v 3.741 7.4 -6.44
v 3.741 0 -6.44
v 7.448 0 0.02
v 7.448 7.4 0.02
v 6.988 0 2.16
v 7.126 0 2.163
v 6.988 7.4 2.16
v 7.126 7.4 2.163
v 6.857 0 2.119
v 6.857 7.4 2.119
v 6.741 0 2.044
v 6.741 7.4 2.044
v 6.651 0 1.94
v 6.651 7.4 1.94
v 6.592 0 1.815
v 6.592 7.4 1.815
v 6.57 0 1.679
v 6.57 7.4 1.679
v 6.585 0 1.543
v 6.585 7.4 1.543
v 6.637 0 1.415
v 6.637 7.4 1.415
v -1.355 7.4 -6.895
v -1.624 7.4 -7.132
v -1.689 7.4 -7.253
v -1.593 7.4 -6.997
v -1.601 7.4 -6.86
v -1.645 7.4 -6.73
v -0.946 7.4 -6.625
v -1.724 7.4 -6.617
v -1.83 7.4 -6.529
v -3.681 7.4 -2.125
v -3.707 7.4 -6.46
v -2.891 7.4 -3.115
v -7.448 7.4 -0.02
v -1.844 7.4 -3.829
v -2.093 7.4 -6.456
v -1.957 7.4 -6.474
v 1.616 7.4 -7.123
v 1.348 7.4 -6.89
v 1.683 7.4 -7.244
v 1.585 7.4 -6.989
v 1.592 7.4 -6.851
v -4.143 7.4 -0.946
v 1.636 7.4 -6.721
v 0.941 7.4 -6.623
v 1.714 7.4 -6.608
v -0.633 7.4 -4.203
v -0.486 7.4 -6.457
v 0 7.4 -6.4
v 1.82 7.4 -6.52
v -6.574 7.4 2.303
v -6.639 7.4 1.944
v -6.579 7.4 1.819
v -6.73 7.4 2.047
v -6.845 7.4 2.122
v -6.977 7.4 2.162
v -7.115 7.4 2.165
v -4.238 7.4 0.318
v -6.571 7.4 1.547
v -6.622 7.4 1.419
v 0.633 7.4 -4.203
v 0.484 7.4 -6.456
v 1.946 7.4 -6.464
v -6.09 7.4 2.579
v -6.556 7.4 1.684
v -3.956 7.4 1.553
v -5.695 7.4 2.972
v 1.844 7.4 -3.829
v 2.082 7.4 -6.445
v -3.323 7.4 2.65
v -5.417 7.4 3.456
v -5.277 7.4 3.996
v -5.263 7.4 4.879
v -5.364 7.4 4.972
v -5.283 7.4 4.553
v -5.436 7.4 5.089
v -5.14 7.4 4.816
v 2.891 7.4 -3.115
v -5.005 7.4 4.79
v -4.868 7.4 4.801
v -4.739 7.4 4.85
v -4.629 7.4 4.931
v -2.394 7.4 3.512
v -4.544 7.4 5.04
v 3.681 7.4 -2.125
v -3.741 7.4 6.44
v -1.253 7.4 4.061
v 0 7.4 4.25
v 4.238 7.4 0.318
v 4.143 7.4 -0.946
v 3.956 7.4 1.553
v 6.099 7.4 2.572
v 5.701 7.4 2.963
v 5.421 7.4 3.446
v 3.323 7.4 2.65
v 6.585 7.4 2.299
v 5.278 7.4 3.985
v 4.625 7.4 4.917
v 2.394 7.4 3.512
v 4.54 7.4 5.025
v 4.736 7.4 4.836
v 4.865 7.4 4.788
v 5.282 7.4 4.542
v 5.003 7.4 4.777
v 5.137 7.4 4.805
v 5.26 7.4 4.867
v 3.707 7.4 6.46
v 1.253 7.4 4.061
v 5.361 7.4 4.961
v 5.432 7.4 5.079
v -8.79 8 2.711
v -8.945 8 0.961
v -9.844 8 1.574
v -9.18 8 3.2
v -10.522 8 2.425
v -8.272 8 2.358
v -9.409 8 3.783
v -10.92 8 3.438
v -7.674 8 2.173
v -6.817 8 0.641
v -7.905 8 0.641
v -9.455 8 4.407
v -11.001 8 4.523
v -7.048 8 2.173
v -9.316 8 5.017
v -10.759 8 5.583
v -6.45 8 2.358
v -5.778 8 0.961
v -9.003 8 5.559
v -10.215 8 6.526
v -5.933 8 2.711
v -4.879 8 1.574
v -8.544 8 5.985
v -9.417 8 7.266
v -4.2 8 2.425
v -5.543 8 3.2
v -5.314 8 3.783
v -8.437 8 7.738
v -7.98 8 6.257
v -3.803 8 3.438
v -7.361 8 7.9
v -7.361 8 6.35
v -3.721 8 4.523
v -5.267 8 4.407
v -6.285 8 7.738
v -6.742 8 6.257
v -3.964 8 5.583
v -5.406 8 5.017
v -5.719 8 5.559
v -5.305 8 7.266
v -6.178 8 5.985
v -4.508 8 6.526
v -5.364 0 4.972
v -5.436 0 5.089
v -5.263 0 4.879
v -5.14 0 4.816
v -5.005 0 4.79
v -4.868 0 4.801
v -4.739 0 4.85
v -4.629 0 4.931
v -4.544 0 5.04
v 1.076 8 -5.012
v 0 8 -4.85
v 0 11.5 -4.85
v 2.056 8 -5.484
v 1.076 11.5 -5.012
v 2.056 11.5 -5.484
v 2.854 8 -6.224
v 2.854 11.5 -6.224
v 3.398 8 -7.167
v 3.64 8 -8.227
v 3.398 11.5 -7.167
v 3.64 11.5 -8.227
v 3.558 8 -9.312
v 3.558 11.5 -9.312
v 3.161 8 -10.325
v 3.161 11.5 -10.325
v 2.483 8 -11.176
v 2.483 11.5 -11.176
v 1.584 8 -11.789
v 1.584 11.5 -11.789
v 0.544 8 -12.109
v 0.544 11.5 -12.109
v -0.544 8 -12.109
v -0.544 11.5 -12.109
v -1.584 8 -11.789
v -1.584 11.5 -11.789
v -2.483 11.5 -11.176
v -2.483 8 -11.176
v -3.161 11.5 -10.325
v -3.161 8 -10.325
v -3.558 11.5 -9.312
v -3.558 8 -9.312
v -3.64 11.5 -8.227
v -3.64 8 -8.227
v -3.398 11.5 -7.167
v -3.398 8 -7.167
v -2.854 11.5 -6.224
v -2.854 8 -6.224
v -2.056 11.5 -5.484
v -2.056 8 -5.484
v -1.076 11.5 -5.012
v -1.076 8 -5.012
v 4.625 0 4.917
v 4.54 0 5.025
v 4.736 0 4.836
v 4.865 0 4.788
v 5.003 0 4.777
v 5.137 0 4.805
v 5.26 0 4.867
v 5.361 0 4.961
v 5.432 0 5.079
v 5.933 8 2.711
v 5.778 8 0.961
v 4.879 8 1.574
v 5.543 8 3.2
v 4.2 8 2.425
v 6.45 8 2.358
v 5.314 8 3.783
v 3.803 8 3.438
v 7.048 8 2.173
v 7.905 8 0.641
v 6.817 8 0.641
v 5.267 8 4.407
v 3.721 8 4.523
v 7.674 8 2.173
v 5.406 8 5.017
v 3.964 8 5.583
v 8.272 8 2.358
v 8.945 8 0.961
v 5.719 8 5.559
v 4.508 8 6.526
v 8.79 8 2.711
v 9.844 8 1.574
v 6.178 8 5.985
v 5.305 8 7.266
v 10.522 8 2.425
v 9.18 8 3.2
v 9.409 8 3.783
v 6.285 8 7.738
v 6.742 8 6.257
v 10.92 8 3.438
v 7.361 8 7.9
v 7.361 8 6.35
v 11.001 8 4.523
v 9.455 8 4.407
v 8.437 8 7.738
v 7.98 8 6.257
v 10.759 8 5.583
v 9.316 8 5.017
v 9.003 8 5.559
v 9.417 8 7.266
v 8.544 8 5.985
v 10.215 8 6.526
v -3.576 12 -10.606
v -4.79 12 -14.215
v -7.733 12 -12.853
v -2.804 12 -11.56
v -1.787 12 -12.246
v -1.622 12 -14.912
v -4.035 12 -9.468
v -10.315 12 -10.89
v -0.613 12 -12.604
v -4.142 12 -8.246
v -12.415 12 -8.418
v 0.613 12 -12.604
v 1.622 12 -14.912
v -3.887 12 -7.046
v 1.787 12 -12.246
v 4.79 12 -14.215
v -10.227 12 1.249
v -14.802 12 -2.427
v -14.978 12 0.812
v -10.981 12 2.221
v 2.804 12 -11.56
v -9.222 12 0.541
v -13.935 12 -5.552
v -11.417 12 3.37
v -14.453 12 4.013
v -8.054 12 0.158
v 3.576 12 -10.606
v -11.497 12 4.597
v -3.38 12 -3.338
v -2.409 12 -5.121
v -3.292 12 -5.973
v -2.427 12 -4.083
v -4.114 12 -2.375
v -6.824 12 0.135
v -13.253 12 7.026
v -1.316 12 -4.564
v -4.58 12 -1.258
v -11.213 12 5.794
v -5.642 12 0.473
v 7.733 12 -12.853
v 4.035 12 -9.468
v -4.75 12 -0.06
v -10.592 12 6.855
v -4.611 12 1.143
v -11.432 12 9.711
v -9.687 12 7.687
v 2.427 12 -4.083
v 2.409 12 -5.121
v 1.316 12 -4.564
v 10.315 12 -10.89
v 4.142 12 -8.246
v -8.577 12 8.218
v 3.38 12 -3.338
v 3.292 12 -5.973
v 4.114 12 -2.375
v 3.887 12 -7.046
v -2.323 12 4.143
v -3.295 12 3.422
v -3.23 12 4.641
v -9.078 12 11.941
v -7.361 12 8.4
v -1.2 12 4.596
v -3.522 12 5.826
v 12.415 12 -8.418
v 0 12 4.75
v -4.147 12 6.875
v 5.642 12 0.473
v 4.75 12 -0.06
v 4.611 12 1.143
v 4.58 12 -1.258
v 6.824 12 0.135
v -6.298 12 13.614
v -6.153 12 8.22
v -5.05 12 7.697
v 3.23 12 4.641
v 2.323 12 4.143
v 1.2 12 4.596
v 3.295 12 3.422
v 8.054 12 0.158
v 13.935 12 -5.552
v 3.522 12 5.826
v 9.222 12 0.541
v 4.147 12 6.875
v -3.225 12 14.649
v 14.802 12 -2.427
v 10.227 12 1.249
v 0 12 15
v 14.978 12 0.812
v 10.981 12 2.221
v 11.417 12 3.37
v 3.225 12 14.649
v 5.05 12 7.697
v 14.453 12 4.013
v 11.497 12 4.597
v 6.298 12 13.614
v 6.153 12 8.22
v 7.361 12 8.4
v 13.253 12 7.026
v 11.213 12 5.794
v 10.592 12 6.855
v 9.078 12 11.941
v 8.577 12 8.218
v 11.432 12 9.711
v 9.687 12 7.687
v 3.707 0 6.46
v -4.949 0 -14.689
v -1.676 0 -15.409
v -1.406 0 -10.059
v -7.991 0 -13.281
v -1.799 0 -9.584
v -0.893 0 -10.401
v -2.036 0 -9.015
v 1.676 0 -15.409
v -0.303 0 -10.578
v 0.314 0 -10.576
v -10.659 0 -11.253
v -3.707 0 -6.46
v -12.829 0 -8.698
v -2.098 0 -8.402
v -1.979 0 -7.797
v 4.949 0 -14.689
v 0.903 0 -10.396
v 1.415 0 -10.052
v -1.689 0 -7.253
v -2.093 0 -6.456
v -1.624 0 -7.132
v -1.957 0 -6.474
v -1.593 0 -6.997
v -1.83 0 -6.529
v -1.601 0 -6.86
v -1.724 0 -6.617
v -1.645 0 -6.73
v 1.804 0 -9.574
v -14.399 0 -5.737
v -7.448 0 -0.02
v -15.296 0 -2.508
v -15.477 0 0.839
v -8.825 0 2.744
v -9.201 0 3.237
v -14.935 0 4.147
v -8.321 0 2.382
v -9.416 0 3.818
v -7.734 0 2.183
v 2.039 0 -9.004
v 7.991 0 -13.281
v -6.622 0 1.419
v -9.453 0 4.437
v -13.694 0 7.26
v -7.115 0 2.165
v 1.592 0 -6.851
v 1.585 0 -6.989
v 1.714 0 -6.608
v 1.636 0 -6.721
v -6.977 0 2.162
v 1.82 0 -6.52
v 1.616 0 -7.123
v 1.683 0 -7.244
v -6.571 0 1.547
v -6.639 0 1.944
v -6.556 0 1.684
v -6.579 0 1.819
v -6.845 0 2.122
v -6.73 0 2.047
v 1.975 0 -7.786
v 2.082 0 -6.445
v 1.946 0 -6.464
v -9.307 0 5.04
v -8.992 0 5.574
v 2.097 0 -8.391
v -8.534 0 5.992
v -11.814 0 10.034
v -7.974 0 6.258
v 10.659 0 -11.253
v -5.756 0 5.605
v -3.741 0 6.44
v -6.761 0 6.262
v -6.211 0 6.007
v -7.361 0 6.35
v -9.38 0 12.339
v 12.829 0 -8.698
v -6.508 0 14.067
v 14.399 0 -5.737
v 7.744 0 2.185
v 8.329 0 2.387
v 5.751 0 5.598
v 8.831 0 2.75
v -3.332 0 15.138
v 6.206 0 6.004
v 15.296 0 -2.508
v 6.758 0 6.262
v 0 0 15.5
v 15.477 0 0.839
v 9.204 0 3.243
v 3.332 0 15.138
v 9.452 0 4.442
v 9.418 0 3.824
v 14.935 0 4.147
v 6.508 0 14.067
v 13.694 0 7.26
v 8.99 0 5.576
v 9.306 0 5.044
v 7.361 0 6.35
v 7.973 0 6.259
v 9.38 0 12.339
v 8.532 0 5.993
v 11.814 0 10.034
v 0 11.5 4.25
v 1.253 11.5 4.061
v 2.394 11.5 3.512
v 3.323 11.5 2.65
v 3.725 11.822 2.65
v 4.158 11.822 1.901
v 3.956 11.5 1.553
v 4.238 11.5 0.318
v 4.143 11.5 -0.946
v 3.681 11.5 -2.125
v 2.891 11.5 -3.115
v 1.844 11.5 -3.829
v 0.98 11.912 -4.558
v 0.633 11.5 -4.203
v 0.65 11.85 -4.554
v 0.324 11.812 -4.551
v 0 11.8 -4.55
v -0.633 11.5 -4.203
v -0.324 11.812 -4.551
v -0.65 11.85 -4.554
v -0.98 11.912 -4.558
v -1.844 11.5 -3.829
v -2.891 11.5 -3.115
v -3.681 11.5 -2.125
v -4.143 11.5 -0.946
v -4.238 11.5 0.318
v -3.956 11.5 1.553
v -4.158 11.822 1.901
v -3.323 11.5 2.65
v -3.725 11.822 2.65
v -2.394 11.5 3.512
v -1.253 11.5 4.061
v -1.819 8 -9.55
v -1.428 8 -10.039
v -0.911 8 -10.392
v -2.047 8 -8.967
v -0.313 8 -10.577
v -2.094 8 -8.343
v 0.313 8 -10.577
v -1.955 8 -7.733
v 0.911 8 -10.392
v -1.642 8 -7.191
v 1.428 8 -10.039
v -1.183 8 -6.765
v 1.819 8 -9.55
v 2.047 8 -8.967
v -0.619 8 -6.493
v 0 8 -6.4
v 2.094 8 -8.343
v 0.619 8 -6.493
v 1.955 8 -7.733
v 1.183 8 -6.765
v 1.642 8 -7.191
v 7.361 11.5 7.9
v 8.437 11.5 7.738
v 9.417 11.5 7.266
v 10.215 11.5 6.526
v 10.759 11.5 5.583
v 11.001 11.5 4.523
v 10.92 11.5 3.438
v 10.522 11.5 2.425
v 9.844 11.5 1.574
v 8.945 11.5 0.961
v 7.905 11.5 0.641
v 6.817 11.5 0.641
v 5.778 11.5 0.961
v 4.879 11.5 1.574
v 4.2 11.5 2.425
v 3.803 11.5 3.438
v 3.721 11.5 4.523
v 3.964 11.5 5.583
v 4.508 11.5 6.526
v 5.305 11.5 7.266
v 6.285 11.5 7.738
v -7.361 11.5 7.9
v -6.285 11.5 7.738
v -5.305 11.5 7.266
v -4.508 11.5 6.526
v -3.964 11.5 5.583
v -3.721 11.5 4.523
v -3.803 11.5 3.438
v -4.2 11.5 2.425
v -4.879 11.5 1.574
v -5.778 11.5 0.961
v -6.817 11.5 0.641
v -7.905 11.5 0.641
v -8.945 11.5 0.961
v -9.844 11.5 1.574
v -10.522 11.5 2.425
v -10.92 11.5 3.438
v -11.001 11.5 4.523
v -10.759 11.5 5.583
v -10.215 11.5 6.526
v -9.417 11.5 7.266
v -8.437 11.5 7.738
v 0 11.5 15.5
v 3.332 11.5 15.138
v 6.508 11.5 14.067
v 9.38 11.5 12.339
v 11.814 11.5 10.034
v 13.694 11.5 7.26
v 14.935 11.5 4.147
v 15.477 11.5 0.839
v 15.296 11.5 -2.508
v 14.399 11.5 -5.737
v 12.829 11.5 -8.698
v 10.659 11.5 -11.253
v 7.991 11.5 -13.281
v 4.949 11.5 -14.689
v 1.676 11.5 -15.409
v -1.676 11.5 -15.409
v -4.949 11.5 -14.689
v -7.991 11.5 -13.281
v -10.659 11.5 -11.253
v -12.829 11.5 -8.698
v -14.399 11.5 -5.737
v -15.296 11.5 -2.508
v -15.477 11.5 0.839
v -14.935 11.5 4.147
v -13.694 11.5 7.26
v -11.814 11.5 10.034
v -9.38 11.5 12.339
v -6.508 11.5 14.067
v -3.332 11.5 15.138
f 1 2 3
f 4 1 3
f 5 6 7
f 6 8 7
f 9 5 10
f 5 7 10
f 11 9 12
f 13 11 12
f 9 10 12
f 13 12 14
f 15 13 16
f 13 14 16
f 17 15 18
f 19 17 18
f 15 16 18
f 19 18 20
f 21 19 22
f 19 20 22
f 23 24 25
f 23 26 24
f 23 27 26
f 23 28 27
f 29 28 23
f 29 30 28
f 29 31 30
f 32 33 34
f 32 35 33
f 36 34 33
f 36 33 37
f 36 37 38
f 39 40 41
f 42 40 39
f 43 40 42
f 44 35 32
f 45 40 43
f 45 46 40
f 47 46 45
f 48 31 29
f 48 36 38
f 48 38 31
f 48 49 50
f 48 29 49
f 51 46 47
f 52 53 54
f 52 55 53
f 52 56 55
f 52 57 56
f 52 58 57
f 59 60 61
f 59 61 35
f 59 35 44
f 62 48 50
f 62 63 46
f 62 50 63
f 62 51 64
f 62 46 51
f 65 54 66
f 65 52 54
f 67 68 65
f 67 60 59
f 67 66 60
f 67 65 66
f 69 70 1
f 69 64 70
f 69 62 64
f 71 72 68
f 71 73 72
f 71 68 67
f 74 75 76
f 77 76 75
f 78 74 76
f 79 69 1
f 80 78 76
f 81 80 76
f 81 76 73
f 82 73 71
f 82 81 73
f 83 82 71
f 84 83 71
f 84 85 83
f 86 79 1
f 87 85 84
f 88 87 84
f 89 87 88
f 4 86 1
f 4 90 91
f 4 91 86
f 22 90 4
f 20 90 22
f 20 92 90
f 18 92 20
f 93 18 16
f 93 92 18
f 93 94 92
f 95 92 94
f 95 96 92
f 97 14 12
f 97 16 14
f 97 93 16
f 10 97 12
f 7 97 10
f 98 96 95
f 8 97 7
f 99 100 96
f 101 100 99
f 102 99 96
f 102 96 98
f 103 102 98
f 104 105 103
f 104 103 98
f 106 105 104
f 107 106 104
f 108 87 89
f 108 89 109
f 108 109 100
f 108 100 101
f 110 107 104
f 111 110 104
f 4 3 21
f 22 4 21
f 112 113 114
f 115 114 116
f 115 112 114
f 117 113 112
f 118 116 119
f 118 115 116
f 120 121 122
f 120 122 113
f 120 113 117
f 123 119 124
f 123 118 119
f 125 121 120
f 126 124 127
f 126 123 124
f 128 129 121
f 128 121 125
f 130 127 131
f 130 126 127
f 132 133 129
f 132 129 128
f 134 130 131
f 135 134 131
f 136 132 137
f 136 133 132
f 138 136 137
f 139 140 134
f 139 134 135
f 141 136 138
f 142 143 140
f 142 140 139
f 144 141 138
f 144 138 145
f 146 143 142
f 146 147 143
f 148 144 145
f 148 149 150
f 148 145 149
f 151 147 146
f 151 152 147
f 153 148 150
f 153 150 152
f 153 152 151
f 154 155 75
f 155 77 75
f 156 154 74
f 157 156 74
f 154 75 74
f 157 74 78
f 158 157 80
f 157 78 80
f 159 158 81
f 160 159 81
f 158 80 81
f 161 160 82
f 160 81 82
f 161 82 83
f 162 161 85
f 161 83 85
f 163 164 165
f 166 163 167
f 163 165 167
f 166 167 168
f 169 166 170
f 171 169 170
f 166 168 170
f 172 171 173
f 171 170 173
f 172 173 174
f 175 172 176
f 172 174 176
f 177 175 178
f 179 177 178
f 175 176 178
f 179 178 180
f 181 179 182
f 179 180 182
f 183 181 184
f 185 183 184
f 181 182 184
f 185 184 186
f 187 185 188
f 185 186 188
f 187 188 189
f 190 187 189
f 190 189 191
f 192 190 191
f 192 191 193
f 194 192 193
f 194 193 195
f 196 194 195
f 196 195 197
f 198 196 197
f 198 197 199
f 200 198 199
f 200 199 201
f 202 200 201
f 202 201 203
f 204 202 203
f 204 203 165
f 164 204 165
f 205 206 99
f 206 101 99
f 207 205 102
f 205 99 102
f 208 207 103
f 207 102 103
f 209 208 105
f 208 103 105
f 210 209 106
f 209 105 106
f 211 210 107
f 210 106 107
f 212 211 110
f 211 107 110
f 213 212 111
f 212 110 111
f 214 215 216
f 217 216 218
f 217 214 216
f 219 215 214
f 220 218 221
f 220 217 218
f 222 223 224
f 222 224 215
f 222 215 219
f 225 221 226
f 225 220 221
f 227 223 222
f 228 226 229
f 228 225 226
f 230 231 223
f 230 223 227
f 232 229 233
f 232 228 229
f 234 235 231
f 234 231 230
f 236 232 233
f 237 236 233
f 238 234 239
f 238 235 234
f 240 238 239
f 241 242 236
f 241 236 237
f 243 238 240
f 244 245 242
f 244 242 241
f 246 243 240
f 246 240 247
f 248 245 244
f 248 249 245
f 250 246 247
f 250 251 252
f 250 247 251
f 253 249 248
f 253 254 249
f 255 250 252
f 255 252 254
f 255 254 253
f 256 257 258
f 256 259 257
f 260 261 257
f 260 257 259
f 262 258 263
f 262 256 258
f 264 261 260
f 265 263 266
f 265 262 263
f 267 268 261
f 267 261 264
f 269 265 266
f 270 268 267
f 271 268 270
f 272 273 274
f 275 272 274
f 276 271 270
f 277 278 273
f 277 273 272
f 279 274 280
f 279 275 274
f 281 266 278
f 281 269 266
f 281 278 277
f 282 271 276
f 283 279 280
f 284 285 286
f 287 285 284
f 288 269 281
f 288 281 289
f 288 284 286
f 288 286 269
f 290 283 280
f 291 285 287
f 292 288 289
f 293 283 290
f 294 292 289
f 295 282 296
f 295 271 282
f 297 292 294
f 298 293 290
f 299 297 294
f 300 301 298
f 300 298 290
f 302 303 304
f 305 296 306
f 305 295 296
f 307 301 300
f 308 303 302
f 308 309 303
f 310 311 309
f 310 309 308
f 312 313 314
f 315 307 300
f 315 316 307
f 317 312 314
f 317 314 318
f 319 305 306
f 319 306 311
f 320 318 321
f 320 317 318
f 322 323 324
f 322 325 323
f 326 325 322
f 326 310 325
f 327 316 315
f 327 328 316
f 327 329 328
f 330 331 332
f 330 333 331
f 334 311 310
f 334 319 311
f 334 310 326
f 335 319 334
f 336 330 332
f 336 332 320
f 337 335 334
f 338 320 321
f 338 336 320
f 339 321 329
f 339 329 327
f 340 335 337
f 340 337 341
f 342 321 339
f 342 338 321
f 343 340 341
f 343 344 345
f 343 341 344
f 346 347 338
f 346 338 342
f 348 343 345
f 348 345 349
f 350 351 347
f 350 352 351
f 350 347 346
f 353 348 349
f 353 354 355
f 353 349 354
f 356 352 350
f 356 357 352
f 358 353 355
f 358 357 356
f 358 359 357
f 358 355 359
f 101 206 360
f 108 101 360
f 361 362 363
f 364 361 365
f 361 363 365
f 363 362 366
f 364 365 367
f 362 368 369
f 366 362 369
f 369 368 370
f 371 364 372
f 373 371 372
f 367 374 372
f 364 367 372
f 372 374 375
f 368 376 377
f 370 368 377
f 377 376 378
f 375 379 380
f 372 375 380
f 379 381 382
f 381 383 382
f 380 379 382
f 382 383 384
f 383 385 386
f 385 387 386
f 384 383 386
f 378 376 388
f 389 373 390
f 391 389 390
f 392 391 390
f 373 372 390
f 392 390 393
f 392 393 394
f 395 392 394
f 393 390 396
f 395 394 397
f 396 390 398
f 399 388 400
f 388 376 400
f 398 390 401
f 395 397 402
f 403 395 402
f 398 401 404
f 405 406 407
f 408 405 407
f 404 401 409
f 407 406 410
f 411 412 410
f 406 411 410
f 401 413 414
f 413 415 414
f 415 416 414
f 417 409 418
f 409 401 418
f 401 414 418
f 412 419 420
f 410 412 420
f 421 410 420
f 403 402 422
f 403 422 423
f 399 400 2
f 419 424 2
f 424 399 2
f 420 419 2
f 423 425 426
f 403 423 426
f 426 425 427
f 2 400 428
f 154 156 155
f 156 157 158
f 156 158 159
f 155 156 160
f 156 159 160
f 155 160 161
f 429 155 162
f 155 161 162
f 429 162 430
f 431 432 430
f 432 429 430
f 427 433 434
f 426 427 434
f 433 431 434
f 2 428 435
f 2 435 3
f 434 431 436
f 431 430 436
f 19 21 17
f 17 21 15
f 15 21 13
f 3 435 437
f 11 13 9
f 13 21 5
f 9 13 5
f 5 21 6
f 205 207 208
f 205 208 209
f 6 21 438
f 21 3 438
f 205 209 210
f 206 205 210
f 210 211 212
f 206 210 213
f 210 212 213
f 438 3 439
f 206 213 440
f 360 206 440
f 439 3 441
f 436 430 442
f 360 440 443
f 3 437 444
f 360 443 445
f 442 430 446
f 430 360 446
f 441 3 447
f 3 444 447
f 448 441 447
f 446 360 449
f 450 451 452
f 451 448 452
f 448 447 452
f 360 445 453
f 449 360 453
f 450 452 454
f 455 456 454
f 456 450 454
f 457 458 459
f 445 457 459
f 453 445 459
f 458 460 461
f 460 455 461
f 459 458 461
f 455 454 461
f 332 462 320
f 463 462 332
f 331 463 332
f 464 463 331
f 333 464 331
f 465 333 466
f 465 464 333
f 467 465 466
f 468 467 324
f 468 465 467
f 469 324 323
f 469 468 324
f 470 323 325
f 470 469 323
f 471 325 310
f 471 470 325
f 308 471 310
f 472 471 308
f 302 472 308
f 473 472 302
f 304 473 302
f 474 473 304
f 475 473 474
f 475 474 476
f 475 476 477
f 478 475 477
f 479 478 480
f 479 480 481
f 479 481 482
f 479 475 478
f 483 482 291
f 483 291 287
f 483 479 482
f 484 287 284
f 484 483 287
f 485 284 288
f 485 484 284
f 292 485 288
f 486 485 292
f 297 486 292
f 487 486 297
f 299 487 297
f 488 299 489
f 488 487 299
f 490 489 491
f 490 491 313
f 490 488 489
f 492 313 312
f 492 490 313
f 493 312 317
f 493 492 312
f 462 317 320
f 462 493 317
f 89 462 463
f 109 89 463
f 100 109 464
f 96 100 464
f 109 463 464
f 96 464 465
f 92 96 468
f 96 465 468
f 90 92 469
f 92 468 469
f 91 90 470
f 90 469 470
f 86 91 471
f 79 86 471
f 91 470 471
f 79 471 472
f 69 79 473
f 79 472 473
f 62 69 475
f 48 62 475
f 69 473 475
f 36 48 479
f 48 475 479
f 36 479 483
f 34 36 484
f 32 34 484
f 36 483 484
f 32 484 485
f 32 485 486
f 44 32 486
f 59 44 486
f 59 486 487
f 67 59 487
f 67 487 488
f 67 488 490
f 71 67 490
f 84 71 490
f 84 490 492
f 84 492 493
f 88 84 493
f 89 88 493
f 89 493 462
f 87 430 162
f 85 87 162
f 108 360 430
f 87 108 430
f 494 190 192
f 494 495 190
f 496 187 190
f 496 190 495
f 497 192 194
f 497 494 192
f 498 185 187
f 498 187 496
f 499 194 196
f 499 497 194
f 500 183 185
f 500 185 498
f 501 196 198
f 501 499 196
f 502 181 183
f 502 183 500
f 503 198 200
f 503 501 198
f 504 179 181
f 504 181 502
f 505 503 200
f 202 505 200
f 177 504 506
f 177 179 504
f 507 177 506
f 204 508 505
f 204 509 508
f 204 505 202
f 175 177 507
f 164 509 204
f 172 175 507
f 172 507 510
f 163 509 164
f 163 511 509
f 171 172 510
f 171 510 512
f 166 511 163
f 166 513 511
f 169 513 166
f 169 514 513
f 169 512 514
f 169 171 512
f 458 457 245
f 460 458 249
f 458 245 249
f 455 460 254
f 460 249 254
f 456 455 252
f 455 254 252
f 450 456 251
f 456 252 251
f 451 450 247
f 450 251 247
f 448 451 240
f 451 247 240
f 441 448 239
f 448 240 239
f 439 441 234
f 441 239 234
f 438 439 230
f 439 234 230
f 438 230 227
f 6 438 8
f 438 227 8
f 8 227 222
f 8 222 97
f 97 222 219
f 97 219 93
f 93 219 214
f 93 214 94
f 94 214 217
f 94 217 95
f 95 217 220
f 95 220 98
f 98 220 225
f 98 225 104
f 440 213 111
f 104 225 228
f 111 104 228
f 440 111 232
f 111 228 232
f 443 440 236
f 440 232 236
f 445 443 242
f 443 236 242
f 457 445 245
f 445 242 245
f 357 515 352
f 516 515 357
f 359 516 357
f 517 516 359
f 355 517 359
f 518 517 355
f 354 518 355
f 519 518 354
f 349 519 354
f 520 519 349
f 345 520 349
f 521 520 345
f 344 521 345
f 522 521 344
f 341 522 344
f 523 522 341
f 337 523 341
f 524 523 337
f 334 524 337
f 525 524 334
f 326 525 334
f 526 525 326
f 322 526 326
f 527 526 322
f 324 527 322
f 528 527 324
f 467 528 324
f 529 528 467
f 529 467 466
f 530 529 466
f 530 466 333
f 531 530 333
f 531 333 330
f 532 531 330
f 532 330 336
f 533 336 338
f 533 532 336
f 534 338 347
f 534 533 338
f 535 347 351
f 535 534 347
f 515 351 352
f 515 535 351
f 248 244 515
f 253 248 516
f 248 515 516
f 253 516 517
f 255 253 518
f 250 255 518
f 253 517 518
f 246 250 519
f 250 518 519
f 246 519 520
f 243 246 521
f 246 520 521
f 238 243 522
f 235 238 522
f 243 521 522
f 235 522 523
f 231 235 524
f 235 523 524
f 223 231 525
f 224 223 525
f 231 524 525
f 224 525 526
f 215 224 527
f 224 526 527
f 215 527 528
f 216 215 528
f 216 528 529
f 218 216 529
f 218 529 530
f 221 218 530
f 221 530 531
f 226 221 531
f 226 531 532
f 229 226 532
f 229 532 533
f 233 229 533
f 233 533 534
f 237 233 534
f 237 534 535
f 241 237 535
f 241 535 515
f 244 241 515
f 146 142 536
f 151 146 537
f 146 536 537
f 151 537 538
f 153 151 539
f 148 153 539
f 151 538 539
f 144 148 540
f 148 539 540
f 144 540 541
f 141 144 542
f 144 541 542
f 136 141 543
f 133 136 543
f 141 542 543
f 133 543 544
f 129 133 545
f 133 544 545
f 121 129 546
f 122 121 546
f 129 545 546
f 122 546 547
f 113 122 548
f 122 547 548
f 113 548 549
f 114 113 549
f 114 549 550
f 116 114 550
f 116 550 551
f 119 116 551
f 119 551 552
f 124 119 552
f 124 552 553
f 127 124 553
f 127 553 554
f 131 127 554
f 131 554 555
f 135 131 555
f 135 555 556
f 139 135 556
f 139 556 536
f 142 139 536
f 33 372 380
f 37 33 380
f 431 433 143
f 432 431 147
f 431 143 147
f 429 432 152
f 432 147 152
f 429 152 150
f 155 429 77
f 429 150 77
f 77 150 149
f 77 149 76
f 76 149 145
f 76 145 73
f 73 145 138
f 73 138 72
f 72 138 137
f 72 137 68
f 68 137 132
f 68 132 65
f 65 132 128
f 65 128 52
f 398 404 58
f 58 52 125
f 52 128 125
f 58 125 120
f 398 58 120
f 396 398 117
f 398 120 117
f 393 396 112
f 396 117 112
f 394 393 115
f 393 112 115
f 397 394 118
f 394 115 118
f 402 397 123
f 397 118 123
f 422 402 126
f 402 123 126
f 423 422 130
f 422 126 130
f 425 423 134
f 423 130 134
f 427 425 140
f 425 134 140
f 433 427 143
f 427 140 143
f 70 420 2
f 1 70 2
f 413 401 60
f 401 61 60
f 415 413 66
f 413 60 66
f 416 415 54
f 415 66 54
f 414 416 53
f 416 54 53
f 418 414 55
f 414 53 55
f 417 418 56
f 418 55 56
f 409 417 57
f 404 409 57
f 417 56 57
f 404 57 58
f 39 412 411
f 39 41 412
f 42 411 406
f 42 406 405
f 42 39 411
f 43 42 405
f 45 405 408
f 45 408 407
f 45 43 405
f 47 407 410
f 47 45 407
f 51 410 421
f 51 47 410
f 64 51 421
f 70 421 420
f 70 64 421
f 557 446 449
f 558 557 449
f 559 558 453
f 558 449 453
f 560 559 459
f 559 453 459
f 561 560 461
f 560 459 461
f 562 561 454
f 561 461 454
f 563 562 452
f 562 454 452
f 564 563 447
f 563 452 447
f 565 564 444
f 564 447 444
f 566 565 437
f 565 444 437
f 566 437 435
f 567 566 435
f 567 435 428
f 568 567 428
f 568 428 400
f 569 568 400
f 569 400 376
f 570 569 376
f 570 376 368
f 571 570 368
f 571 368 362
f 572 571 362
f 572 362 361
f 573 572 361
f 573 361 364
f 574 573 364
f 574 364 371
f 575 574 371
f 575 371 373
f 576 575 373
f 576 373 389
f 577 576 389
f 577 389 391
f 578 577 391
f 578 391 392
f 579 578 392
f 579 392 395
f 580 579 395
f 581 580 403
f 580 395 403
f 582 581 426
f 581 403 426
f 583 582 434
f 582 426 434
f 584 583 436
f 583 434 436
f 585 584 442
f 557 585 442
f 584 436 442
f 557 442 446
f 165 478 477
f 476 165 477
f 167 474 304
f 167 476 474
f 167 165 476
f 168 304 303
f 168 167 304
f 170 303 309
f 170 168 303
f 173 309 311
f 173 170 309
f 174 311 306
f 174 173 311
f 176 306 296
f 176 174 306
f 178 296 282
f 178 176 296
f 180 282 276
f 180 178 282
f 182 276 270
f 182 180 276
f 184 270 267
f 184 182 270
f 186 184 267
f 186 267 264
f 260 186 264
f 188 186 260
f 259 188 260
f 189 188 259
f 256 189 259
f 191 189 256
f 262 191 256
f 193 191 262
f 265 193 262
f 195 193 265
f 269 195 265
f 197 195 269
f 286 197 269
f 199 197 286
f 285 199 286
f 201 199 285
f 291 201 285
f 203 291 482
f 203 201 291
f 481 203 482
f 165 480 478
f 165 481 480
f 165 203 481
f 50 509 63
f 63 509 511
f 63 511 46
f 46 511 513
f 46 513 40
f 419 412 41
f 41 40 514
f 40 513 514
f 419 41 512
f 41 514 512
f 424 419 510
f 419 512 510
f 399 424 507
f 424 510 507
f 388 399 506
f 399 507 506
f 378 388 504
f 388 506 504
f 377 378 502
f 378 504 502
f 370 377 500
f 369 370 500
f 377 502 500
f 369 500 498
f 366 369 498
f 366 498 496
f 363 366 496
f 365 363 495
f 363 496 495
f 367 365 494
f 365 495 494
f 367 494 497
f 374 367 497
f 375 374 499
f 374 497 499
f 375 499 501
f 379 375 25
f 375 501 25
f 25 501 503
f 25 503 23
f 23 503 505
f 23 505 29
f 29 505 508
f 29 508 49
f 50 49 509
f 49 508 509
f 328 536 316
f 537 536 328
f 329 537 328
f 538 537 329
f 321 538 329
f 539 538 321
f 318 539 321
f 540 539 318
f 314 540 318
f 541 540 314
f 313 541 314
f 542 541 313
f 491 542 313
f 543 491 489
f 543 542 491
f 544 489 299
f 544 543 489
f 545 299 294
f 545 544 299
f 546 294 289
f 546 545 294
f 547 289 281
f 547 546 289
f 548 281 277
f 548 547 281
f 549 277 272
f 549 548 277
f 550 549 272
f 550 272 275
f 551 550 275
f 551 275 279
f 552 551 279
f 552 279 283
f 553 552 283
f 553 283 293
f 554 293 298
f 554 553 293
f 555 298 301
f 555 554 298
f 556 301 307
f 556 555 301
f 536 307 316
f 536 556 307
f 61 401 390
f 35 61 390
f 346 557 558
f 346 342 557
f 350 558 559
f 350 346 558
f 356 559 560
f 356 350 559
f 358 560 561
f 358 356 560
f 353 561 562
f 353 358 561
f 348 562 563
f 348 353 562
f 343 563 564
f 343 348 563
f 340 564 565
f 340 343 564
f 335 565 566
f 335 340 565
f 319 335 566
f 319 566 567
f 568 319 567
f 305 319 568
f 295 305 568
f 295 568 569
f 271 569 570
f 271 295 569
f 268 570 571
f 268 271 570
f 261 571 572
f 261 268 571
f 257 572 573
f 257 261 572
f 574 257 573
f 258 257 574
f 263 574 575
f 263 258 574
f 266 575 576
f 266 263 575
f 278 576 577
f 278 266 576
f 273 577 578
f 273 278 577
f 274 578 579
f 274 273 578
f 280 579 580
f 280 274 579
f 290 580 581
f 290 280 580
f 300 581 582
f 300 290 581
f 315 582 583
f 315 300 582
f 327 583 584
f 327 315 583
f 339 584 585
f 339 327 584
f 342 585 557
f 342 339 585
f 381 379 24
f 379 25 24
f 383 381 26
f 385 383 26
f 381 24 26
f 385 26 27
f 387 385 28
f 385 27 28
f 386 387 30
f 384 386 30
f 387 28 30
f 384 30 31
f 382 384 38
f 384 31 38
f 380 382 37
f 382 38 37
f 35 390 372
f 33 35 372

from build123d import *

# Parameters (mm, degrees)
SKETCH1_R           = 15.5
BOSS_EXTRUDE1_DEPTH = 12
SKETCH2_R           = 2.1
CUT_EXTRUDE1_DEPTH  = 25.989997999
SKETCH3_R           = 4.25
CUT_EXTRUDE2_DEPTH  = 25.989997999
CUT_EXTRUDE3_DEPTH  = 7.4
SKETCH5_R           = 3.65
CUT_EXTRUDE4_DEPTH  = 4
CHAMFER1_SIZE       = 0.5
FILLET_1_R          = 0.5


with BuildPart() as part:
    # Sketch1 → Boss-Extrude1 (new body)
    with BuildSketch(Plane(origin=(0, 0, 0), x_dir=(1, 0, 0), z_dir=(0, 1, 0))):
        with Locations(Location((0, 0, 0), (0, 0, 270))):
            Circle(SKETCH1_R)
    extrude(amount=BOSS_EXTRUDE1_DEPTH)

    # Sketch2 → Cut-Extrude1 (cut, through all)
    with BuildSketch(Plane(origin=(0, 12, 0), x_dir=(1, 0, 0), z_dir=(0, 1, 0))):
        with Locations(Location((0, 8.5, 0), (0, 0, 270))):
            Circle(SKETCH2_R)
        with Locations(Location((7.361215932, -4.25, 0), (0, 0, 270))):
            Circle(SKETCH2_R)
        with Locations(Location((-7.361215932, -4.25, 0), (0, 0, 270))):
            Circle(SKETCH2_R)
    extrude(amount=-CUT_EXTRUDE1_DEPTH, mode=Mode.SUBTRACT)

    # Sketch3 → Cut-Extrude2 (cut, through all)
    with BuildSketch(Plane(origin=(0, 12, 0), x_dir=(1, 0, 0), z_dir=(0, 1, 0))):
        with Locations(Location((0, 0, 0), (0, 0, 270))):
            Circle(SKETCH3_R)
    extrude(amount=-CUT_EXTRUDE2_DEPTH, mode=Mode.SUBTRACT)

    # Sketch4 → Cut-Extrude3 (cut)
    with BuildSketch(Plane.XZ):
        Polygon((3.740942098, -6.44013604), (7.447792464, 0.019682871), (3.706850366, 6.459818911), (-3.740942098, 6.44013604), (-7.447792464, -0.019682871), (-3.706850366, -6.459818911), align=None)
    extrude(amount=-CUT_EXTRUDE3_DEPTH, mode=Mode.SUBTRACT)

    # Sketch5 → Cut-Extrude4 (cut)
    with BuildSketch(Plane(origin=(0, 12, 0), x_dir=(1, 0, 0), z_dir=(0, 1, 0))):
        with Locations(Location((0, 8.5, 0), (0, 0, 270))):
            Circle(SKETCH5_R)
        with Locations(Location((7.361215932, -4.25, 0), (0, 0, 270))):
            Circle(SKETCH5_R)
        with Locations(Location((-7.361215932, -4.25, 0), (0, 0, 270))):
            Circle(SKETCH5_R)
    extrude(amount=-CUT_EXTRUDE4_DEPTH, mode=Mode.SUBTRACT)

    # Chamfer1
    # the kernel refuses this chamfer: 0.5 mm, written as the material it takes off along each edge
    with BuildSketch(Plane(origin=(0, 12, 0), x_dir=(0, 0, 1), z_dir=(-1, 0, 0))) as chamfer1_piece_1:
        Polygon((4.25 + CHAMFER1_SIZE, 0), (4.25, -CHAMFER1_SIZE), (4.25, 0), align=None)
    revolve(axis=Axis((0, 12, 0), (0, 1, 0)), mode=Mode.SUBTRACT)
    with BuildSketch(Plane(origin=(0, 12, 0), x_dir=(0, 0, 1), z_dir=(-1, 0, 0))) as chamfer1_piece_2:
        Polygon((15.5, -CHAMFER1_SIZE), (15.5 - CHAMFER1_SIZE, 0), (15.5, 0), align=None)
    revolve(axis=Axis((0, 12, 0), (0, 1, 0)), mode=Mode.SUBTRACT)
    with BuildSketch(Plane(origin=(0, 12, -8.5), x_dir=(0, 0, 1), z_dir=(-1, 0, 0))) as chamfer1_piece_3:
        Polygon((3.65 + CHAMFER1_SIZE, 0), (3.65, -CHAMFER1_SIZE), (3.65, 0), align=None)
    revolve(axis=Axis((0, 12, -8.5), (0, 1, 0)), mode=Mode.SUBTRACT)
    with BuildSketch(Plane(origin=(7.361215932, 12, 4.25), x_dir=(0, 0, 1), z_dir=(-1, 0, 0))) as chamfer1_piece_4:
        Polygon((3.65 + CHAMFER1_SIZE, 0), (3.65, -CHAMFER1_SIZE), (3.65, 0), align=None)
    revolve(axis=Axis((7.361215932, 12, 4.25), (0, 1, 0)), mode=Mode.SUBTRACT)
    with BuildSketch(Plane(origin=(-7.361215932, 12, 4.25), x_dir=(0, 0, 1), z_dir=(-1, 0, 0))) as chamfer1_piece_5:
        Polygon((3.65 + CHAMFER1_SIZE, 0), (3.65, -CHAMFER1_SIZE), (3.65, 0), align=None)
    revolve(axis=Axis((-7.361215932, 12, 4.25), (0, 1, 0)), mode=Mode.SUBTRACT)

    # Скругление1
    fillet_1_edges = [part.edges().sort_by_distance(p)[0] for p in [
        (5.359734874, 3.7, 3.614332183),
        (5.817474247, 3.7, 2.826321101),
        (-5.809970925, 3.7, 2.834500467),
        (-5.356402996, 3.7, 3.624919933),
        (0.450236051, 3.7, -6.44883265),
        (-0.461071251, 3.7, -6.451241034),
    ]]
    fillet(fillet_1_edges, radius=FILLET_1_R)


solid = part.part
